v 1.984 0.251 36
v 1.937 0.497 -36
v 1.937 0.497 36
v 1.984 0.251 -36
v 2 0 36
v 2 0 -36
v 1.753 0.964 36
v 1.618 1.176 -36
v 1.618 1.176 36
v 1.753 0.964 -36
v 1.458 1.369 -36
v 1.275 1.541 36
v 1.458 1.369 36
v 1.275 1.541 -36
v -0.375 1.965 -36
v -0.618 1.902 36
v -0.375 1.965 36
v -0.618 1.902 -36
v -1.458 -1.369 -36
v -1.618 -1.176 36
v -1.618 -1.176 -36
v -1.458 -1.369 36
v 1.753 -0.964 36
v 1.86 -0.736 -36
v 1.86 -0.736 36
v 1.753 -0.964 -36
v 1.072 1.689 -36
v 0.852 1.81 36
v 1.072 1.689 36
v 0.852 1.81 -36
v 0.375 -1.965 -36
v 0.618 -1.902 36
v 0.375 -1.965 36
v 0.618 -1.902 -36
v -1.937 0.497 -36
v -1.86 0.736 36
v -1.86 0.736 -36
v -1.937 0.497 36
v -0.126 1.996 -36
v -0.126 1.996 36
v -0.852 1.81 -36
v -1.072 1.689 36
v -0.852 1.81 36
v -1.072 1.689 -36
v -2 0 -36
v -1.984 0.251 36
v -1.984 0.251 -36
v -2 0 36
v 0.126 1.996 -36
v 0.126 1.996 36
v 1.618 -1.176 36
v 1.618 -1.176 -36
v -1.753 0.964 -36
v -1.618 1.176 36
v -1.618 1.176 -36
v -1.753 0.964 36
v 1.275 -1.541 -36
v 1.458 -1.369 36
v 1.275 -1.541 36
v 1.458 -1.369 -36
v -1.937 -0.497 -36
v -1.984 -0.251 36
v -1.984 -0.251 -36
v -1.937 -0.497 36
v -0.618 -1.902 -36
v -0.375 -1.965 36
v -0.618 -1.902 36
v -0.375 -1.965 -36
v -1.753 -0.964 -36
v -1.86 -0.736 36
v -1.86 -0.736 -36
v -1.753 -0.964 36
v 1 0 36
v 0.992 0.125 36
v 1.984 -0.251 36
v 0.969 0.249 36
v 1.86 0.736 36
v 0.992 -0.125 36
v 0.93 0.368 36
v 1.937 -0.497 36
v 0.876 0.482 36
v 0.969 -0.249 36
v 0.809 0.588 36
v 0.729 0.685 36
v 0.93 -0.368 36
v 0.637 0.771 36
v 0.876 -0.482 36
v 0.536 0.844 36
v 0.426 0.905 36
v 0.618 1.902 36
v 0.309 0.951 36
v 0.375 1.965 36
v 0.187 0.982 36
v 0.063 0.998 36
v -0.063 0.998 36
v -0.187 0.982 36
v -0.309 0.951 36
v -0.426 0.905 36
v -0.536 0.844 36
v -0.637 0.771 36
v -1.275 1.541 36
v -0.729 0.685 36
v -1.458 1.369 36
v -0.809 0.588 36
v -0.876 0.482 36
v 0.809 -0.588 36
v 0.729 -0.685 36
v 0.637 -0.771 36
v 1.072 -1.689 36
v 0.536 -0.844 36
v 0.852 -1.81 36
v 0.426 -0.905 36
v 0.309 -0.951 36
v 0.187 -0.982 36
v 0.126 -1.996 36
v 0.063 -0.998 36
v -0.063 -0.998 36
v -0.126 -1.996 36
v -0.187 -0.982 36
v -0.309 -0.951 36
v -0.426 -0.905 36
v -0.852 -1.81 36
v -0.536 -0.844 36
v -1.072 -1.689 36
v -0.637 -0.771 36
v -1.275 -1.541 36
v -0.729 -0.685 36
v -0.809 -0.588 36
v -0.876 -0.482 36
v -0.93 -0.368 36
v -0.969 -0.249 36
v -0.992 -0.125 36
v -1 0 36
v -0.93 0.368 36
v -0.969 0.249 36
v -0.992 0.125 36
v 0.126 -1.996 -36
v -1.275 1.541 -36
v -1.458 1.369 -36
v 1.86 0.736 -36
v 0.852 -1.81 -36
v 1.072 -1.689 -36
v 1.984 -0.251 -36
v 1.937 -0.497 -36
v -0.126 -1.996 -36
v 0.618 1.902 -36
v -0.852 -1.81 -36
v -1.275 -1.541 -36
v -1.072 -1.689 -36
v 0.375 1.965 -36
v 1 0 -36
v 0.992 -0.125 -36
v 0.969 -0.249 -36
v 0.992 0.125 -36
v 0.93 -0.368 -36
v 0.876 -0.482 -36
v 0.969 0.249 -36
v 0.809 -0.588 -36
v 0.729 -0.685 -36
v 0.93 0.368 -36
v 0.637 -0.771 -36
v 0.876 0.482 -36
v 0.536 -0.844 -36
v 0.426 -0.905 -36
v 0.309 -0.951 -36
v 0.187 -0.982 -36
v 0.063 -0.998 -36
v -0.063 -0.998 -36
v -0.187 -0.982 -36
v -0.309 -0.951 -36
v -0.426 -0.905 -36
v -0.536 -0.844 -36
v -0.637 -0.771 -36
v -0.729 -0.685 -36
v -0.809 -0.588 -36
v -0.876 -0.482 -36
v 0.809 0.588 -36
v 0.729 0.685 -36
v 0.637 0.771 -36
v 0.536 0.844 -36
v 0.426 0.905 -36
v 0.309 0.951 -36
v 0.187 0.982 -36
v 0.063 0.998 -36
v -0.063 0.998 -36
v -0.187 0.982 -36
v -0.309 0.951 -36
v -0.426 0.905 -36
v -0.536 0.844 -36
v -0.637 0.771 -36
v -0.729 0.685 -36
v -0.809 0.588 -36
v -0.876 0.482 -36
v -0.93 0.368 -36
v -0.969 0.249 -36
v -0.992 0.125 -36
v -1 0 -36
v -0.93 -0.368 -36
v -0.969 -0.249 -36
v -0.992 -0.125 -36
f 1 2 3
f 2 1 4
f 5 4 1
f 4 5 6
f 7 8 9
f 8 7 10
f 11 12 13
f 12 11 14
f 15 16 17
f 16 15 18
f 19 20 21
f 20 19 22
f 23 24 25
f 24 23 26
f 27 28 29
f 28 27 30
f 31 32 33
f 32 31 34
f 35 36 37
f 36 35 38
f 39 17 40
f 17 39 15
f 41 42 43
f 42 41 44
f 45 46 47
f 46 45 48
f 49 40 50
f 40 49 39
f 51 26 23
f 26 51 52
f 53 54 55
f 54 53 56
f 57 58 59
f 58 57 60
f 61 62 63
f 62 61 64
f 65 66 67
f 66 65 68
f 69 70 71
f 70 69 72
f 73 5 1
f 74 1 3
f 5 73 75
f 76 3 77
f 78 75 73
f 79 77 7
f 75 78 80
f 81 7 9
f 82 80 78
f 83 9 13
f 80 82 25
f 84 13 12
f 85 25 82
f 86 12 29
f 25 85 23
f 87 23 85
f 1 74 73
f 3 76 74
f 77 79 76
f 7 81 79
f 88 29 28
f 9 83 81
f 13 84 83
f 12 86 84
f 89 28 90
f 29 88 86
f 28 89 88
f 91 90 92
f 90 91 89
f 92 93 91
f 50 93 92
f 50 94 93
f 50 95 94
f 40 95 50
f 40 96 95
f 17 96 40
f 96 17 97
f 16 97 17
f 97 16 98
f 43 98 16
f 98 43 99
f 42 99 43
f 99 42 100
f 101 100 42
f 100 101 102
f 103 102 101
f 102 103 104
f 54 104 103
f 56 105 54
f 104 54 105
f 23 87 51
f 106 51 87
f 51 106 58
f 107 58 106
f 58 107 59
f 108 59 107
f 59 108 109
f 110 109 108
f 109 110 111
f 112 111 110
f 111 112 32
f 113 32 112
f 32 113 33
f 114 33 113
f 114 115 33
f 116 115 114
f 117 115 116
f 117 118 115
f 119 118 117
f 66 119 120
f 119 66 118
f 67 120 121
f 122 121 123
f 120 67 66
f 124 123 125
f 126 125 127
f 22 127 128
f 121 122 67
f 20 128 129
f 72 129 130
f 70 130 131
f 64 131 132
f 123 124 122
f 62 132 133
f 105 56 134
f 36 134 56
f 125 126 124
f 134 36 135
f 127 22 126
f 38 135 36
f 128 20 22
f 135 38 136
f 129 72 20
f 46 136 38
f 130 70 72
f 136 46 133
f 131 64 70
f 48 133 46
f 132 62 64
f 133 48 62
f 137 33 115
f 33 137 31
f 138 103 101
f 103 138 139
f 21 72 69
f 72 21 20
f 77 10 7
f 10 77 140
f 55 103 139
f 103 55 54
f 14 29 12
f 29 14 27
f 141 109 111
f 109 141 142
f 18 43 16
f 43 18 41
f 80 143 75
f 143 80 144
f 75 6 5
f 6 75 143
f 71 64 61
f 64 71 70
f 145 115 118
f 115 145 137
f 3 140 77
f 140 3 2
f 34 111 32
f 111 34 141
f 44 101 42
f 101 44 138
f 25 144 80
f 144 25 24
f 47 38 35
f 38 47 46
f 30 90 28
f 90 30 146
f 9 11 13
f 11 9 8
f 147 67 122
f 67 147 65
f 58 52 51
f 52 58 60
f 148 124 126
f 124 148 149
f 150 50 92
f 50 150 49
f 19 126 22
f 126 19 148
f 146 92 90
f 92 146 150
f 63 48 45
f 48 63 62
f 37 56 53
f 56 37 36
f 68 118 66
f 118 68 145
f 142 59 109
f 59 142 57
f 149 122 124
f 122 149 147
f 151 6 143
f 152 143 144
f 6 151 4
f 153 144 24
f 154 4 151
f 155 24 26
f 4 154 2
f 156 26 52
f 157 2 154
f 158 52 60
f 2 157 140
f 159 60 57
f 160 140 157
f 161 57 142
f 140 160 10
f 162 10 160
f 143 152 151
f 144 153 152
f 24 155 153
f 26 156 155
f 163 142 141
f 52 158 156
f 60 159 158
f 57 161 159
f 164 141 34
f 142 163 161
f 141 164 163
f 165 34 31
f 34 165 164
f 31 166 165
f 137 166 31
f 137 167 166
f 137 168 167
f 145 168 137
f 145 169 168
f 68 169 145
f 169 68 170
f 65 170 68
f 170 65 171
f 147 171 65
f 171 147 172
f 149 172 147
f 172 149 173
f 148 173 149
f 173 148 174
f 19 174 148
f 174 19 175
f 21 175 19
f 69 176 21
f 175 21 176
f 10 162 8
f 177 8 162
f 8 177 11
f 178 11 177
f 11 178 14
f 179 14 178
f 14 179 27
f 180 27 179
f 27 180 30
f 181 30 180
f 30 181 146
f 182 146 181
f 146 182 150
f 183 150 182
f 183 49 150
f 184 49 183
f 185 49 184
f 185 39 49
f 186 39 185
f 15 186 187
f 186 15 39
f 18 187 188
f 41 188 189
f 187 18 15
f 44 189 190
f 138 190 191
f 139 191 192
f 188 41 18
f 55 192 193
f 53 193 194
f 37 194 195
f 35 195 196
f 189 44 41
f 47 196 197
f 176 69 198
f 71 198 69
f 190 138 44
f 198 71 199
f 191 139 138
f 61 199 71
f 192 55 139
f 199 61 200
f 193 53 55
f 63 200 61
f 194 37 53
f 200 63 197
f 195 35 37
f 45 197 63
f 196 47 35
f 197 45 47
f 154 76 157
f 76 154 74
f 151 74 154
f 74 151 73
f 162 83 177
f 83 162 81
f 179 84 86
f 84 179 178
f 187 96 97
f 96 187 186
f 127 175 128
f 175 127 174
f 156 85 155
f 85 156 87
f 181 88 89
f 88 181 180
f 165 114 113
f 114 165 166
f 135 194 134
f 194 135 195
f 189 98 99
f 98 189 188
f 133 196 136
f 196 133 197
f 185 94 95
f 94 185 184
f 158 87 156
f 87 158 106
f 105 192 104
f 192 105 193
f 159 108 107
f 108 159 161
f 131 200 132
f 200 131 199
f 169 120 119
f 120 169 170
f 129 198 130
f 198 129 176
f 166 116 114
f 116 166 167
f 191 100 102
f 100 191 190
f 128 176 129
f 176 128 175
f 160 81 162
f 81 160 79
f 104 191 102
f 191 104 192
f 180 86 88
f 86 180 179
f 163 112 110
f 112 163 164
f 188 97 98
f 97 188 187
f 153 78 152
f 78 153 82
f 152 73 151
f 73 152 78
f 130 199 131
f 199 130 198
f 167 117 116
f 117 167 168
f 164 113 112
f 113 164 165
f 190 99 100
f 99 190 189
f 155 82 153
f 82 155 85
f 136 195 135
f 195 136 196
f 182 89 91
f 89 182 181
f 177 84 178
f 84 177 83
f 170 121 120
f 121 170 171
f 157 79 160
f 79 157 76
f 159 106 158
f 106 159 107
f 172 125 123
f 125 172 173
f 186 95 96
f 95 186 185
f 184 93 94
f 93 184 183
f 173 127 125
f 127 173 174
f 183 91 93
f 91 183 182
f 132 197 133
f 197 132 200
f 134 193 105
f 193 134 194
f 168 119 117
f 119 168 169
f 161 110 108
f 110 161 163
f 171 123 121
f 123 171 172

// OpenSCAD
$fn = 50;


difference() {
	union() {
		translate(v = [0, 0, -36.0000000000]) {
			cylinder(h = 72, r = 2.0000000000);
		}
	}
	union() {
		translate(v = [0, 0, -100.0000000000]) {
			cylinder(h = 200, r = 1.0000000000);
		}
	}
}
